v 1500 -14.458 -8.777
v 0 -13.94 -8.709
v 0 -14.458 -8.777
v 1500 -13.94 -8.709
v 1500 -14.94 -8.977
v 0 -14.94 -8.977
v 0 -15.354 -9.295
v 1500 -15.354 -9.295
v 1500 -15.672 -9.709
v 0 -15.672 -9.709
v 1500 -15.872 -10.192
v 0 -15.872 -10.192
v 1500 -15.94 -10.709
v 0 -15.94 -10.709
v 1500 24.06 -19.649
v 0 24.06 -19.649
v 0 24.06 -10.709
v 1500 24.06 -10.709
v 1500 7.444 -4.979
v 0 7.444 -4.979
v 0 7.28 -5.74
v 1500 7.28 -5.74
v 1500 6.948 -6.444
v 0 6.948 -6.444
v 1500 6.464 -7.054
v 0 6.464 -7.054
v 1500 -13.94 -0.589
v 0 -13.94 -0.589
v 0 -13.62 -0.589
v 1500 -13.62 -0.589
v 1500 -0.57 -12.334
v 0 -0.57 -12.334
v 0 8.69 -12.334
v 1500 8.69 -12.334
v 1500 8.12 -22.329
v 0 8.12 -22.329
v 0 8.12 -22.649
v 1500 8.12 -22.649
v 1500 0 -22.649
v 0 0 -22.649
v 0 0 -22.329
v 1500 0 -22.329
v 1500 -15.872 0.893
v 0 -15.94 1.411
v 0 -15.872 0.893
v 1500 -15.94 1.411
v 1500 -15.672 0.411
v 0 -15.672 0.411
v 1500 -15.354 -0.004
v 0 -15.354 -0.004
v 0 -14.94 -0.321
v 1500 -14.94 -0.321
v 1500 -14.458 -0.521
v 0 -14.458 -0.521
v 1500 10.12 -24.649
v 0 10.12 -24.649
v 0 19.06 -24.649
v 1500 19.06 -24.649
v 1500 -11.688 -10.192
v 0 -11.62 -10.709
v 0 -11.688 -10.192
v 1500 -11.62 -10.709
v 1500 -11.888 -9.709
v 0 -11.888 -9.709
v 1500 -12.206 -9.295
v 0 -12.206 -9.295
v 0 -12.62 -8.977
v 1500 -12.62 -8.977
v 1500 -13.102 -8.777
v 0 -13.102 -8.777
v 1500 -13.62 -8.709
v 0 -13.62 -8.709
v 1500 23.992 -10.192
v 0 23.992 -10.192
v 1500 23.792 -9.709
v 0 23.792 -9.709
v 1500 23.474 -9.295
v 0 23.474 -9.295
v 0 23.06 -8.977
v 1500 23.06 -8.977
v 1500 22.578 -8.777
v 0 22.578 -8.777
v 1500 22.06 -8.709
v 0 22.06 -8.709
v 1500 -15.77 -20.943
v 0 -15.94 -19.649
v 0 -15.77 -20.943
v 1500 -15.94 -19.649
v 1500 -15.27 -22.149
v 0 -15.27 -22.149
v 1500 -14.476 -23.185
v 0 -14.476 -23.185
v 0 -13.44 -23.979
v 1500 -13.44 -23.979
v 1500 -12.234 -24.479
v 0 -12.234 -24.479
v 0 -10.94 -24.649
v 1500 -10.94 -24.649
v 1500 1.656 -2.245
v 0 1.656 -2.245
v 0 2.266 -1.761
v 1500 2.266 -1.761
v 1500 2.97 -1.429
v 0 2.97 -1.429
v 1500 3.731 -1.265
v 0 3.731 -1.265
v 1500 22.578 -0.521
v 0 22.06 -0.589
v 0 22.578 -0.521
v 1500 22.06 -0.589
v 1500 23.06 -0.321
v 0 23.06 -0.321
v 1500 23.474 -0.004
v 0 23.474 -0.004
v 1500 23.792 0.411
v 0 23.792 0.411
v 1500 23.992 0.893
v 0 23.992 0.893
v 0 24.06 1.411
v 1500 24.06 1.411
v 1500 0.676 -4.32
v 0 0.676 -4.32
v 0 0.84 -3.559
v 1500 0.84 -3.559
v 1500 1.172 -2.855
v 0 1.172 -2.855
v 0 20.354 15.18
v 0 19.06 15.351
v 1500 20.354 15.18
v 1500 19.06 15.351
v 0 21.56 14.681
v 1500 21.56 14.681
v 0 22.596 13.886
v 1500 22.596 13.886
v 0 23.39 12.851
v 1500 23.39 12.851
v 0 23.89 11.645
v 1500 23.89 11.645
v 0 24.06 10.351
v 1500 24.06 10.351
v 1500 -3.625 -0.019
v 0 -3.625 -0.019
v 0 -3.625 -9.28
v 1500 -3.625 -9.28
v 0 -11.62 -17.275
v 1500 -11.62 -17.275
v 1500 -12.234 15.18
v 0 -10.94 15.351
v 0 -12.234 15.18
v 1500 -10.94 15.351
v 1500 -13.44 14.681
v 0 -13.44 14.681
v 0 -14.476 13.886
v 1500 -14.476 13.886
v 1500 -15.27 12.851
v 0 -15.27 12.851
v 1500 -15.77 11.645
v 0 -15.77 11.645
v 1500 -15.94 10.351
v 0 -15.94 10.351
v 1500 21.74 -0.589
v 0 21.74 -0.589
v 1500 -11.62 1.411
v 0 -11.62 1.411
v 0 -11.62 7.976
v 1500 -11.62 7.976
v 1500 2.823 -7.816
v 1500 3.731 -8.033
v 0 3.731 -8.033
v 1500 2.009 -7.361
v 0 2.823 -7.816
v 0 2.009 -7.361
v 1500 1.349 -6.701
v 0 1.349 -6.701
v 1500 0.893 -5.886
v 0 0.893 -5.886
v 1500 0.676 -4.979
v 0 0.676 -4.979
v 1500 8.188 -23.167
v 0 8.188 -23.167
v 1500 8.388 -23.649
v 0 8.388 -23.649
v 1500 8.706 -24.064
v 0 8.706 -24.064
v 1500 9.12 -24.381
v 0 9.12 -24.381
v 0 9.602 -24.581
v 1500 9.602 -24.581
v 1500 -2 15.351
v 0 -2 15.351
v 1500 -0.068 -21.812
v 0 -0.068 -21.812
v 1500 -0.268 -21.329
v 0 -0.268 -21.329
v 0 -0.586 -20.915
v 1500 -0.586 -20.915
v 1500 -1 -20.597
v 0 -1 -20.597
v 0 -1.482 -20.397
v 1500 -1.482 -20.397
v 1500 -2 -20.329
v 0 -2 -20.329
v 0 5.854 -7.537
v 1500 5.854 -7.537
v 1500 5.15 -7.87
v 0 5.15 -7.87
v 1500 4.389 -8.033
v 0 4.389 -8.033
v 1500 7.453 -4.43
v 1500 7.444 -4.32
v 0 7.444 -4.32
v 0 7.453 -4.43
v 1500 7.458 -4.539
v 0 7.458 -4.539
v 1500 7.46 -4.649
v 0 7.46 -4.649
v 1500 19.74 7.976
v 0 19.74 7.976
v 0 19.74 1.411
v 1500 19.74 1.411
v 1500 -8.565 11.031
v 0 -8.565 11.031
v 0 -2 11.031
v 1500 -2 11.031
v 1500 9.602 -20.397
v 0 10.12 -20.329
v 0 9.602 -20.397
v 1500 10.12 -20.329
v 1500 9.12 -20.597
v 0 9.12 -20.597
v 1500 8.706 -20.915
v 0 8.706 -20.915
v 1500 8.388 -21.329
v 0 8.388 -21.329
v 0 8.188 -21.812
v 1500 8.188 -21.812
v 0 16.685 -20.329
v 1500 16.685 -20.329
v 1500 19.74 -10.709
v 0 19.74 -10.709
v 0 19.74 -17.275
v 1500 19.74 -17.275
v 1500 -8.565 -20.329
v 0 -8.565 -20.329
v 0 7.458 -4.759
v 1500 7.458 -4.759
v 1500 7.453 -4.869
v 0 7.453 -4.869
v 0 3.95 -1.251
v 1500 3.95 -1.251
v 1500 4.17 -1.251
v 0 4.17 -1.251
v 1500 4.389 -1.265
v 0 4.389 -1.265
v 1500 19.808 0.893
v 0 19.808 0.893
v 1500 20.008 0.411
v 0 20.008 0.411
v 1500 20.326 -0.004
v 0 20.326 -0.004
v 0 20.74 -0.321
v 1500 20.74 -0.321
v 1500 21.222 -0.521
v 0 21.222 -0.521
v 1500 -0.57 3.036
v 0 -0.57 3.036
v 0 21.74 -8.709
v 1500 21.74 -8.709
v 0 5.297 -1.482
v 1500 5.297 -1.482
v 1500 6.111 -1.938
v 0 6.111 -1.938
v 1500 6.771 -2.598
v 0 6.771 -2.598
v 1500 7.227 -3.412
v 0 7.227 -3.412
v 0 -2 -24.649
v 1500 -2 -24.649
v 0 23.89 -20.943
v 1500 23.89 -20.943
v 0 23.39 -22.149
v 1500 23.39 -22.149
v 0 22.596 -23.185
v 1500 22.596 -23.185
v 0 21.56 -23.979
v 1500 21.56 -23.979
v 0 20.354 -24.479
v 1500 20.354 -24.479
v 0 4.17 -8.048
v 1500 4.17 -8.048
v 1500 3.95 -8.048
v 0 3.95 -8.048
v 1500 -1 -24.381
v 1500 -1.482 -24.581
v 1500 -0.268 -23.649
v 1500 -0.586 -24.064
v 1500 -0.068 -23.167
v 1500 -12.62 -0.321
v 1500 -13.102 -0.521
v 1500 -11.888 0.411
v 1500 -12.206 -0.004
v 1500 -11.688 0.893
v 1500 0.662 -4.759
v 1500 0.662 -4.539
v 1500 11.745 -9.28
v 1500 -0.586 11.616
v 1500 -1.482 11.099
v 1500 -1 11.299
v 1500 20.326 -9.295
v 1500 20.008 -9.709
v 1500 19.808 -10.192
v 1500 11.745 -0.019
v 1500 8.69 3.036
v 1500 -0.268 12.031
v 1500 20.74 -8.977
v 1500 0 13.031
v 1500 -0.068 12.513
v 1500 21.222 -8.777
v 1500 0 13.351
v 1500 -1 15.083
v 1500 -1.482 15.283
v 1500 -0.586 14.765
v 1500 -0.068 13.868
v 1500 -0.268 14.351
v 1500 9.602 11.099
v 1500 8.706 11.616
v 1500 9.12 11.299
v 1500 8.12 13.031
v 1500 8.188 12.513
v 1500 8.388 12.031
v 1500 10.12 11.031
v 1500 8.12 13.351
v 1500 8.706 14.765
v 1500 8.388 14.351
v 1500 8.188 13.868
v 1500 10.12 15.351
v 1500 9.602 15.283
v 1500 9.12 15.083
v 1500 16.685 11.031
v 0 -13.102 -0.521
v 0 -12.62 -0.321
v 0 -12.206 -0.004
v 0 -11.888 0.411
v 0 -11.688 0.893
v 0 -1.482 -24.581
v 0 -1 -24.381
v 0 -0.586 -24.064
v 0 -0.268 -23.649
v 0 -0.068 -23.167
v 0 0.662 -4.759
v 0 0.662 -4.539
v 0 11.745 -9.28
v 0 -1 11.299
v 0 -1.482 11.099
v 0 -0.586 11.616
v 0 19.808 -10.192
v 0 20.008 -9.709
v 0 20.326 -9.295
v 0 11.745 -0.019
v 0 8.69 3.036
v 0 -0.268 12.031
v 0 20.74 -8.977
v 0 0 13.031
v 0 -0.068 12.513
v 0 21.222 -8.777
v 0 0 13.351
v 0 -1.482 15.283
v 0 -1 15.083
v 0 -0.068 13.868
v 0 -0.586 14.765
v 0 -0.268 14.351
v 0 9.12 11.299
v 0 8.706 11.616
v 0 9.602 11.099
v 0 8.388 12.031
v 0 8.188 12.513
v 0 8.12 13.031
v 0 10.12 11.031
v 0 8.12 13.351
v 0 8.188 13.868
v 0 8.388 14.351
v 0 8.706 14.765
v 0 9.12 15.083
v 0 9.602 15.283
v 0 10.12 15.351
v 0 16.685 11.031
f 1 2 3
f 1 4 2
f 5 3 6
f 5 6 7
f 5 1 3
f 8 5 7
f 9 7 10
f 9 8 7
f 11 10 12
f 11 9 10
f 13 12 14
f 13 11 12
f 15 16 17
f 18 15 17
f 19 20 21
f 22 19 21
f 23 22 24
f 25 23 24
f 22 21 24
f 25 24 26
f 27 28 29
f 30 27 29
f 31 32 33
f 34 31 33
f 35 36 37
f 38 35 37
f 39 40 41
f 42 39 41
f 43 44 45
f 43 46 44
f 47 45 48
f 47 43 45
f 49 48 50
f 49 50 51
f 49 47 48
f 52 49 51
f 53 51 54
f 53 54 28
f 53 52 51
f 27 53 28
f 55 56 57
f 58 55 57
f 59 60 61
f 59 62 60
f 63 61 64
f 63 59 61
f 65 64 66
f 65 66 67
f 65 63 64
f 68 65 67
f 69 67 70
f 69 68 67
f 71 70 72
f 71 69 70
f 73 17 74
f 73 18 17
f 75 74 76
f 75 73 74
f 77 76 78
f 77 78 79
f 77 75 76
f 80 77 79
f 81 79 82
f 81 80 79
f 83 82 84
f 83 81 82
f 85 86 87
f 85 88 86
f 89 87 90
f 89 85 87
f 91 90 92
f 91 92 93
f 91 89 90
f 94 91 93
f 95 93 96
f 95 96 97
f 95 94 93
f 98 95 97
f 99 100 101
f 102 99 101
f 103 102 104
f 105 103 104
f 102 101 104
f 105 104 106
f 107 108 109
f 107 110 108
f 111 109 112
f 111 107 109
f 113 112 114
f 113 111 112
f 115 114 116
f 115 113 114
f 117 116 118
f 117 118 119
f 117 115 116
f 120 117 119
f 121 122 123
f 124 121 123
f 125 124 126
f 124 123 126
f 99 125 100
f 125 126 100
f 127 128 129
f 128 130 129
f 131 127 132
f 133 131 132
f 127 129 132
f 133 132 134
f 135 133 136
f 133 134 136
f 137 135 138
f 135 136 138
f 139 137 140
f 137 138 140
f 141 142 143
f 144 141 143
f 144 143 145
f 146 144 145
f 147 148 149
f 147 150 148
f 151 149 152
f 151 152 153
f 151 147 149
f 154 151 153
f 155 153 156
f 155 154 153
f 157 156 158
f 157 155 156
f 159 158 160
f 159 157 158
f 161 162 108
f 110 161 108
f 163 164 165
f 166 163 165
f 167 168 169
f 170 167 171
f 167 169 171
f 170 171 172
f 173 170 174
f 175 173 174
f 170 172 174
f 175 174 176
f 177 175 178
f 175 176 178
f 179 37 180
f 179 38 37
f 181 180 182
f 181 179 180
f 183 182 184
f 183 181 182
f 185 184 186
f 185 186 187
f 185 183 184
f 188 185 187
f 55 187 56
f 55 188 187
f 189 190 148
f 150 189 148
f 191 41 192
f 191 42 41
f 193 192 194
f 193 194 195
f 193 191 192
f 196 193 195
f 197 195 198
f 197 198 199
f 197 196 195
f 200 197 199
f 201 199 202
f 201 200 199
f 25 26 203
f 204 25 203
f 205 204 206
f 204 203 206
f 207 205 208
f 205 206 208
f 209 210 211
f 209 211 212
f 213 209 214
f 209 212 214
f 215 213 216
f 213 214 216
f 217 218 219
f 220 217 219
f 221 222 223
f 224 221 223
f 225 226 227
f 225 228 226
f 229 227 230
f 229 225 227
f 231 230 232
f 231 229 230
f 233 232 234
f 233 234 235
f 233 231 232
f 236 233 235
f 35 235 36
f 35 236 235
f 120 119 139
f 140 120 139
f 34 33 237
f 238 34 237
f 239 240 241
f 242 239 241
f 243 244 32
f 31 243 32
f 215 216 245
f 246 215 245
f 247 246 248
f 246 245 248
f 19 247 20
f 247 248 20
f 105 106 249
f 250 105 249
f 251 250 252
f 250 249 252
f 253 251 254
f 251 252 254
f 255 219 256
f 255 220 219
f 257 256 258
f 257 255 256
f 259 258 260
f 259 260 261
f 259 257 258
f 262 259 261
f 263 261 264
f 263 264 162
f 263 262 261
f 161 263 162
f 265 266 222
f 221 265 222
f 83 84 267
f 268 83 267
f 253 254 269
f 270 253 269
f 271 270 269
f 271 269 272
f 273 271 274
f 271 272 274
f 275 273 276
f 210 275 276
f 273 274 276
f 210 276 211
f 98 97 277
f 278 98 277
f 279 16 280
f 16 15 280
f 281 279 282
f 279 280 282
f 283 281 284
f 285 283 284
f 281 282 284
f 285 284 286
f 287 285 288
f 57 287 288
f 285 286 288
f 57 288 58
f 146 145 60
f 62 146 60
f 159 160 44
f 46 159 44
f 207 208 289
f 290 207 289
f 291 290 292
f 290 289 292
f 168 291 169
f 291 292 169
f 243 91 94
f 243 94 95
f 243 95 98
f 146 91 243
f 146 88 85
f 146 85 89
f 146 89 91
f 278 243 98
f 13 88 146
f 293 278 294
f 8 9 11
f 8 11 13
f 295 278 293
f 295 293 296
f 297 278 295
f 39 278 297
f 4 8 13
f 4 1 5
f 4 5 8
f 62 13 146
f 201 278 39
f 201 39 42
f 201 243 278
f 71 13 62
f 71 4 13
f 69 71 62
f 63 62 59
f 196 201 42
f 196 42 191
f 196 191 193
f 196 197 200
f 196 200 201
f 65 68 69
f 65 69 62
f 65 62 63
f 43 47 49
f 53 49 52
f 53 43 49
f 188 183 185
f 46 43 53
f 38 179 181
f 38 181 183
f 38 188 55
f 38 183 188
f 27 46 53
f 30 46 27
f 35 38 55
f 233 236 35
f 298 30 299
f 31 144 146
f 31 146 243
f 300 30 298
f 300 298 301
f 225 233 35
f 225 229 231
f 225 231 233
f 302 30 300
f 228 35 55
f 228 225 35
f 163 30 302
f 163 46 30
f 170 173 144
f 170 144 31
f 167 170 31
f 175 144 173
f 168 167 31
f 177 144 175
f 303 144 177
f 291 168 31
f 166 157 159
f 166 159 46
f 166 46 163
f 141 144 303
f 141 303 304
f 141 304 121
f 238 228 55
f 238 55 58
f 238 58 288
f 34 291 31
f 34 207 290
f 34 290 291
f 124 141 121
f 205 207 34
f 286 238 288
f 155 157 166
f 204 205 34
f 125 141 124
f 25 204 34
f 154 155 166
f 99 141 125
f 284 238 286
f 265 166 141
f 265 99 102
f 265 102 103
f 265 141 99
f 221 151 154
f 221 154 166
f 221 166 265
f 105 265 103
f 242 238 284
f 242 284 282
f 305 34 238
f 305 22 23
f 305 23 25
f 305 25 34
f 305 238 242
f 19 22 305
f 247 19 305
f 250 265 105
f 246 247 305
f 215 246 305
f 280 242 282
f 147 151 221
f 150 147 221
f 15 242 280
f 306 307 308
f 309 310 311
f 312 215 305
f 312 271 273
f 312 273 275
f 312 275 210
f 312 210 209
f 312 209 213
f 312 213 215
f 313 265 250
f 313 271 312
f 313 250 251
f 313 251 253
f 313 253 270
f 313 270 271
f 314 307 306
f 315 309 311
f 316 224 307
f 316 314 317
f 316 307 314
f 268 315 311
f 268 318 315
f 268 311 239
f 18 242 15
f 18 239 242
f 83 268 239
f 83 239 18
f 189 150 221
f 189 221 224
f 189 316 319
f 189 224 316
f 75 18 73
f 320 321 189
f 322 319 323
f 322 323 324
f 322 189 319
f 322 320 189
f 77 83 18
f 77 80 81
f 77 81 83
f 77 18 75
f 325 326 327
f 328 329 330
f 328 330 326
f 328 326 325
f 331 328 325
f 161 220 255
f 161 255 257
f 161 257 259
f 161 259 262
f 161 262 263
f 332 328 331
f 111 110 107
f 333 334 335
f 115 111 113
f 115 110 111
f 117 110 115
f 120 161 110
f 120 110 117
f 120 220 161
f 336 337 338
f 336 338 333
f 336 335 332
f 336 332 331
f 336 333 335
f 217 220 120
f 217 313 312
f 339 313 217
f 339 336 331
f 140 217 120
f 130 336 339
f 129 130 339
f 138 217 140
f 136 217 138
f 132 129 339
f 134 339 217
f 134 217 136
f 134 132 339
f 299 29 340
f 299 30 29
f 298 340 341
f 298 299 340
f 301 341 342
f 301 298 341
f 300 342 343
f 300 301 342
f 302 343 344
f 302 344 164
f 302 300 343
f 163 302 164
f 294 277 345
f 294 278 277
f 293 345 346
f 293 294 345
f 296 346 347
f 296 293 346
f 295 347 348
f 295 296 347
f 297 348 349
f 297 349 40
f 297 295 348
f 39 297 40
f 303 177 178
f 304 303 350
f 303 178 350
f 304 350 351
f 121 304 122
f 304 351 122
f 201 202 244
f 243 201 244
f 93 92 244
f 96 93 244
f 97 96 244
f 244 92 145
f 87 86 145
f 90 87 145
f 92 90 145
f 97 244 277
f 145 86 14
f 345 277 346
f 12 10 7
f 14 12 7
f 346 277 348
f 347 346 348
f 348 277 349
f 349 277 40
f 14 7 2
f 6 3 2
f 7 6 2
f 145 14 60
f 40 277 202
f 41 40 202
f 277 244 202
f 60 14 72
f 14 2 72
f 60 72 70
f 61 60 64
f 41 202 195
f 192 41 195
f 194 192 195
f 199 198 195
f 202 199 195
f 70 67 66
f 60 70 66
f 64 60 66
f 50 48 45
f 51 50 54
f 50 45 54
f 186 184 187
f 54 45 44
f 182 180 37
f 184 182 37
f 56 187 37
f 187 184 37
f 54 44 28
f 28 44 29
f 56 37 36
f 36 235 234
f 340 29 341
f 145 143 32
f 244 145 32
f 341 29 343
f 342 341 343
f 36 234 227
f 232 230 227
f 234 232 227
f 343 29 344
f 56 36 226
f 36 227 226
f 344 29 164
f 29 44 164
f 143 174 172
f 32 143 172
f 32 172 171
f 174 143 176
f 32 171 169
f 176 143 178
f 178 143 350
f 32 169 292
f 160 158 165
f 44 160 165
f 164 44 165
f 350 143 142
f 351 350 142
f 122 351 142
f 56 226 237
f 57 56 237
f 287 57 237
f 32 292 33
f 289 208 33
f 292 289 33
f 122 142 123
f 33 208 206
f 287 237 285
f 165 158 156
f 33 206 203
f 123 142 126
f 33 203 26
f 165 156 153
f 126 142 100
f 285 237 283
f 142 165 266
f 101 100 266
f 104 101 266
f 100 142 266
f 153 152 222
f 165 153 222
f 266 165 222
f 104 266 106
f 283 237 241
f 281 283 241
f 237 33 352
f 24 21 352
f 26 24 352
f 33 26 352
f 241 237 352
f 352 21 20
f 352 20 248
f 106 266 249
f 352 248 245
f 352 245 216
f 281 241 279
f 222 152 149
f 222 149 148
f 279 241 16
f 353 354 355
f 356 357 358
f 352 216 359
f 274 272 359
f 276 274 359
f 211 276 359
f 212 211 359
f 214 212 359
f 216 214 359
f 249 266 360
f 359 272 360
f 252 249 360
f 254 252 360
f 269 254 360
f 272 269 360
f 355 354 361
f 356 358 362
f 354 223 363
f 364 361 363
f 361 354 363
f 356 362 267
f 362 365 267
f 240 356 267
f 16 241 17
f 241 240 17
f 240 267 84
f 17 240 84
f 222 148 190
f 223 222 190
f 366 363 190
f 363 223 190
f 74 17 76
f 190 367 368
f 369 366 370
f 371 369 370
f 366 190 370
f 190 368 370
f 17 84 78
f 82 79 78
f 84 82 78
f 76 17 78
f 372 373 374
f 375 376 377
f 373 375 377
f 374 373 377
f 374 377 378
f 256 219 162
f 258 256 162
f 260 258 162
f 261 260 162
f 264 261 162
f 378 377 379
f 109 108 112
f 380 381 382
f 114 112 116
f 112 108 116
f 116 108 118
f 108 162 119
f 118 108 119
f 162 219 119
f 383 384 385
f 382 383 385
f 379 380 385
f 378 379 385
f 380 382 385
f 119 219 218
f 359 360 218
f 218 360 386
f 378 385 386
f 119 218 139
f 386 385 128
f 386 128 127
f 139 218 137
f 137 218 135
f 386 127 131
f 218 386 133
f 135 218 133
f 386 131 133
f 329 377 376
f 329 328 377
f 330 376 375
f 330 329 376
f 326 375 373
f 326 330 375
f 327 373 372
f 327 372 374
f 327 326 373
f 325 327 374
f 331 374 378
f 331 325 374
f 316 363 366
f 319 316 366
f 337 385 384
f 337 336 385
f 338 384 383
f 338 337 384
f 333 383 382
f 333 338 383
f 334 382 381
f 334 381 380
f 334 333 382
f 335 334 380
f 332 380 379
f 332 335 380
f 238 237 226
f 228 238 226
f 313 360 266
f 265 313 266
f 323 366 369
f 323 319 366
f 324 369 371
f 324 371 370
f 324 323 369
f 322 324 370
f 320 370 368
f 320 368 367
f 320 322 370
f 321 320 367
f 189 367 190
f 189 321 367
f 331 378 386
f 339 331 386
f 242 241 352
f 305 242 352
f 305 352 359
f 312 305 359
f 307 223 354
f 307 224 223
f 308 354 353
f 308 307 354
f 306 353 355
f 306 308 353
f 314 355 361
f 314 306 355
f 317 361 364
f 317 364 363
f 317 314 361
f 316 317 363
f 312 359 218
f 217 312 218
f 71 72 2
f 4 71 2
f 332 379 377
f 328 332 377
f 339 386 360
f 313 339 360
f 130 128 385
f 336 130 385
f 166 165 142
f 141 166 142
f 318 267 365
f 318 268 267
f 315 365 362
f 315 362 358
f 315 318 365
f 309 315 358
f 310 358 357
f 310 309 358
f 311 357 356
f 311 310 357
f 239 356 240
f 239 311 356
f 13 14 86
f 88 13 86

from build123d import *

# Parameters (mm, degrees)
F1_DEPTH = 1500
F2_R     = 2
F3_R     = 5


with BuildPart() as f1:
    # F0 (on Right) → F1 (new body)
    with BuildSketch(Plane.YZ):
        Polygon((-11.62, 7.9759603159), (-15.94, 12.2959603159), (-15.94, -0.5893383893), (-11.62, -0.5893383893), align=None)
        Polygon((-11.62, 11.0306616107), (-15.94, 15.3506616107), (-15.94, 12.2959603159), (-11.62, 7.9759603159), (-8.7938307864, 5.1497911023), (-7.266480139, 6.6771417497), align=None)
        Polygon((-8.5652987053, 11.0306616107), (-11.62, 11.0306616107), (-7.266480139, 6.6771417497), (-5.7391294917, 8.2044923971), align=None)
        Polygon((0, 15.3506616107), (-12.8852987053, 15.3506616107), (-8.5652987053, 11.0306616107), (0, 11.0306616107), align=None)
        Polygon((-12.8852987053, 15.3506616107), (-15.94, 15.3506616107), (-11.62, 11.0306616107), (-8.5652987053, 11.0306616107), align=None)
        Polygon((-15.94, -21.5946370946), (-11.62, -17.2746370946), (-11.62, -8.7093383893), (-15.94, -8.7093383893), align=None)
        Polygon((-3.625, -12.3343383893), (-3.625, -9.2796370946), (-11.62, -17.2746370946), (-15.94, -21.5946370946), (-15.94, -24.6493383893), (-12.8852987053, -24.6493383893), (-8.5652987053, -20.3293383893), (-0.5702987053, -12.3343383893), align=None)
        Polygon((0, -20.3293383893), (-8.5652987053, -20.3293383893), (-12.8852987053, -24.6493383893), (0, -24.6493383893), align=None)
        Polygon((14.9650698751, 9.3104327805), (8.6902987053, 3.0356616107), (11.745, 3.0356616107), (11.745, -0.0190396841), (18.0197711699, 6.2557314858), (19.74, 7.9759603159), (16.6852987053, 11.0306616107), align=None)
        Polygon((21.0052987053, 15.3506616107), (16.6852987053, 11.0306616107), (19.74, 7.9759603159), (24.06, 12.2959603159), (24.06, 15.3506616107), align=None)
        Polygon((24.06, 12.2959603159), (19.74, 7.9759603159), (19.74, -0.5893383893), (24.06, -0.5893383893), align=None)
        Polygon((8.12, 11.0306616107), (16.6852987053, 11.0306616107), (21.0052987053, 15.3506616107), (8.12, 15.3506616107), align=None)
        with BuildLine():
            Line((11.745, -9.2796370946), (11.745, -0.0190396841))
            Line((11.745, -0.0190396841), (7.4440143218, -4.3200253623))
            ThreePointArc((7.4440143218, -4.3200253623), (7.456001229, -4.4844879937), (7.46, -4.6493383893))
            ThreePointArc((7.46, -4.6493383893), (7.456001229, -4.8141887849), (7.4440143218, -4.9786514164))
            Line((7.4440143218, -4.9786514164), (11.745, -9.2796370946))
        make_face()
        with BuildLine():
            Line((3.7306869729, -8.0333527111), (-0.5702987053, -12.3343383893))
            Line((-0.5702987053, -12.3343383893), (8.6902987053, -12.3343383893))
            Line((8.6902987053, -12.3343383893), (4.3893130271, -8.0333527111))
            ThreePointArc((4.3893130271, -8.0333527111), (4.06, -8.0493383893), (3.7306869729, -8.0333527111))
        make_face()
        with BuildLine():
            Line((0.6759856782, -4.3200253623), (-3.625, -0.0190396841))
            Line((-3.625, -0.0190396841), (-3.625, -9.2796370946))
            Line((-3.625, -9.2796370946), (0.6759856782, -4.9786514164))
            ThreePointArc((0.6759856782, -4.9786514164), (0.66, -4.6493383893), (0.6759856782, -4.3200253623))
        make_face()
        with BuildLine():
            Line((8.6902987053, 3.0356616107), (-0.5702987053, 3.0356616107))
            Line((-0.5702987053, 3.0356616107), (3.7306869729, -1.2653240675))
            ThreePointArc((3.7306869729, -1.2653240675), (4.06, -1.2493383893), (4.3893130271, -1.2653240675))
            Line((4.3893130271, -1.2653240675), (8.6902987053, 3.0356616107))
        make_face()
        Polygon((-5.7391294917, 8.2044923971), (-7.266480139, 6.6771417497), (-3.625, 3.0356616107), (-0.5702987053, 3.0356616107), align=None)
        Polygon((-3.625, 3.0356616107), (-7.266480139, 6.6771417497), (-8.7938307864, 5.1497911023), (-3.625, -0.0190396841), align=None)
        Polygon((11.745, -12.3343383893), (8.6902987053, -12.3343383893), (16.6852987053, -20.3293383893), (21.0052987053, -24.6493383893), (24.06, -24.6493383893), align=None)
        Polygon((19.74, -17.2746370946), (11.745, -9.2796370946), (11.745, -12.3343383893), (24.06, -24.6493383893), (24.06, -21.5946370946), align=None)
        Polygon((19.74, -8.7093383893), (19.74, -17.2746370946), (24.06, -21.5946370946), (24.06, -8.7093383893), align=None)
        Polygon((21.0052987053, -24.6493383893), (16.6852987053, -20.3293383893), (8.12, -20.3293383893), (8.12, -24.6493383893), align=None)
        with BuildLine():
            Line((11.745, 3.0356616107), (8.6902987053, 3.0356616107))
            Line((8.6902987053, 3.0356616107), (4.3893130271, -1.2653240675))
            ThreePointArc((4.3893130271, -1.2653240675), (6.464163056, -2.2451753333), (7.4440143218, -4.3200253623))
            Line((7.4440143218, -4.3200253623), (11.745, -0.0190396841))
            Line((11.745, -0.0190396841), (11.745, 3.0356616107))
        make_face()
        with BuildLine():
            Line((1.655836944, -2.2451753333), (-3.625, 3.0356616107))
            Line((-3.625, 3.0356616107), (-3.625, -0.0190396841))
            Line((-3.625, -0.0190396841), (0.6759856782, -4.3200253623))
            ThreePointArc((0.6759856782, -4.3200253623), (0.9855894874, -3.1974430763), (1.655836944, -2.2451753333))
        make_face()
        with BuildLine():
            Line((0.6759856782, -4.9786514164), (-3.625, -9.2796370946))
            Line((-3.625, -9.2796370946), (-3.625, -12.3343383893))
            Line((-3.625, -12.3343383893), (-0.5702987053, -12.3343383893))
            Line((-0.5702987053, -12.3343383893), (3.7306869729, -8.0333527111))
            ThreePointArc((3.7306869729, -8.0333527111), (1.655836944, -7.0535014454), (0.6759856782, -4.9786514164))
        make_face()
        with BuildLine():
            Line((11.745, -12.3343383893), (6.464163056, -7.0535014454))
            ThreePointArc((6.464163056, -7.0535014454), (5.511895313, -7.7237489019), (4.3893130271, -8.0333527111))
            Line((4.3893130271, -8.0333527111), (8.6902987053, -12.3343383893))
            Line((8.6902987053, -12.3343383893), (11.745, -12.3343383893))
        make_face()
        with BuildLine():
            ThreePointArc((7.4440143218, -4.9786514164), (7.1344105126, -6.1012337024), (6.464163056, -7.0535014454))
            Line((6.464163056, -7.0535014454), (11.745, -12.3343383893))
            Line((11.745, -12.3343383893), (11.745, -9.2796370946))
            Line((11.745, -9.2796370946), (7.4440143218, -4.9786514164))
        make_face()
        with BuildLine():
            Line((-0.5702987053, 3.0356616107), (-3.625, 3.0356616107))
            Line((-3.625, 3.0356616107), (1.655836944, -2.2451753333))
            ThreePointArc((1.655836944, -2.2451753333), (2.608104687, -1.5749278767), (3.7306869729, -1.2653240675))
            Line((3.7306869729, -1.2653240675), (-0.5702987053, 3.0356616107))
        make_face()
    extrude(amount=F1_DEPTH)

    # F2
    f2_edges = [f1.edges().sort_by_distance(p)[0] for p in [
        (750, 0, 11.030662),
        (750, -11.62, -0.589338),
        (750, -15.94, -0.589338),
        (750, 0, 15.350662),
        (750, 8.12, 11.030662),
        (750, 19.74, -0.589338),
        (750, 24.06, -0.589338),
        (750, 8.12, -24.649338),
        (750, 8.12, 15.350662),
        (750, -15.94, -8.709338),
        (750, -11.62, -8.709338),
        (750, 0, -24.649338),
        (750, 0, -20.329338),
        (750, 8.12, -20.329338),
        (750, 19.74, -8.709338),
        (750, 24.06, -8.709338),
    ]]
    fillet(f2_edges, radius=F2_R)

    # F3
    f3_edges = [f1.edges().sort_by_distance(p)[0] for p in [
        (750, -15.94, 15.350662),
        (750, 24.06, 15.350662),
        (750, 24.06, -24.649338),
        (750, -15.94, -24.649338),
    ]]
    fillet(f3_edges, radius=F3_R)


solid = f1.part
